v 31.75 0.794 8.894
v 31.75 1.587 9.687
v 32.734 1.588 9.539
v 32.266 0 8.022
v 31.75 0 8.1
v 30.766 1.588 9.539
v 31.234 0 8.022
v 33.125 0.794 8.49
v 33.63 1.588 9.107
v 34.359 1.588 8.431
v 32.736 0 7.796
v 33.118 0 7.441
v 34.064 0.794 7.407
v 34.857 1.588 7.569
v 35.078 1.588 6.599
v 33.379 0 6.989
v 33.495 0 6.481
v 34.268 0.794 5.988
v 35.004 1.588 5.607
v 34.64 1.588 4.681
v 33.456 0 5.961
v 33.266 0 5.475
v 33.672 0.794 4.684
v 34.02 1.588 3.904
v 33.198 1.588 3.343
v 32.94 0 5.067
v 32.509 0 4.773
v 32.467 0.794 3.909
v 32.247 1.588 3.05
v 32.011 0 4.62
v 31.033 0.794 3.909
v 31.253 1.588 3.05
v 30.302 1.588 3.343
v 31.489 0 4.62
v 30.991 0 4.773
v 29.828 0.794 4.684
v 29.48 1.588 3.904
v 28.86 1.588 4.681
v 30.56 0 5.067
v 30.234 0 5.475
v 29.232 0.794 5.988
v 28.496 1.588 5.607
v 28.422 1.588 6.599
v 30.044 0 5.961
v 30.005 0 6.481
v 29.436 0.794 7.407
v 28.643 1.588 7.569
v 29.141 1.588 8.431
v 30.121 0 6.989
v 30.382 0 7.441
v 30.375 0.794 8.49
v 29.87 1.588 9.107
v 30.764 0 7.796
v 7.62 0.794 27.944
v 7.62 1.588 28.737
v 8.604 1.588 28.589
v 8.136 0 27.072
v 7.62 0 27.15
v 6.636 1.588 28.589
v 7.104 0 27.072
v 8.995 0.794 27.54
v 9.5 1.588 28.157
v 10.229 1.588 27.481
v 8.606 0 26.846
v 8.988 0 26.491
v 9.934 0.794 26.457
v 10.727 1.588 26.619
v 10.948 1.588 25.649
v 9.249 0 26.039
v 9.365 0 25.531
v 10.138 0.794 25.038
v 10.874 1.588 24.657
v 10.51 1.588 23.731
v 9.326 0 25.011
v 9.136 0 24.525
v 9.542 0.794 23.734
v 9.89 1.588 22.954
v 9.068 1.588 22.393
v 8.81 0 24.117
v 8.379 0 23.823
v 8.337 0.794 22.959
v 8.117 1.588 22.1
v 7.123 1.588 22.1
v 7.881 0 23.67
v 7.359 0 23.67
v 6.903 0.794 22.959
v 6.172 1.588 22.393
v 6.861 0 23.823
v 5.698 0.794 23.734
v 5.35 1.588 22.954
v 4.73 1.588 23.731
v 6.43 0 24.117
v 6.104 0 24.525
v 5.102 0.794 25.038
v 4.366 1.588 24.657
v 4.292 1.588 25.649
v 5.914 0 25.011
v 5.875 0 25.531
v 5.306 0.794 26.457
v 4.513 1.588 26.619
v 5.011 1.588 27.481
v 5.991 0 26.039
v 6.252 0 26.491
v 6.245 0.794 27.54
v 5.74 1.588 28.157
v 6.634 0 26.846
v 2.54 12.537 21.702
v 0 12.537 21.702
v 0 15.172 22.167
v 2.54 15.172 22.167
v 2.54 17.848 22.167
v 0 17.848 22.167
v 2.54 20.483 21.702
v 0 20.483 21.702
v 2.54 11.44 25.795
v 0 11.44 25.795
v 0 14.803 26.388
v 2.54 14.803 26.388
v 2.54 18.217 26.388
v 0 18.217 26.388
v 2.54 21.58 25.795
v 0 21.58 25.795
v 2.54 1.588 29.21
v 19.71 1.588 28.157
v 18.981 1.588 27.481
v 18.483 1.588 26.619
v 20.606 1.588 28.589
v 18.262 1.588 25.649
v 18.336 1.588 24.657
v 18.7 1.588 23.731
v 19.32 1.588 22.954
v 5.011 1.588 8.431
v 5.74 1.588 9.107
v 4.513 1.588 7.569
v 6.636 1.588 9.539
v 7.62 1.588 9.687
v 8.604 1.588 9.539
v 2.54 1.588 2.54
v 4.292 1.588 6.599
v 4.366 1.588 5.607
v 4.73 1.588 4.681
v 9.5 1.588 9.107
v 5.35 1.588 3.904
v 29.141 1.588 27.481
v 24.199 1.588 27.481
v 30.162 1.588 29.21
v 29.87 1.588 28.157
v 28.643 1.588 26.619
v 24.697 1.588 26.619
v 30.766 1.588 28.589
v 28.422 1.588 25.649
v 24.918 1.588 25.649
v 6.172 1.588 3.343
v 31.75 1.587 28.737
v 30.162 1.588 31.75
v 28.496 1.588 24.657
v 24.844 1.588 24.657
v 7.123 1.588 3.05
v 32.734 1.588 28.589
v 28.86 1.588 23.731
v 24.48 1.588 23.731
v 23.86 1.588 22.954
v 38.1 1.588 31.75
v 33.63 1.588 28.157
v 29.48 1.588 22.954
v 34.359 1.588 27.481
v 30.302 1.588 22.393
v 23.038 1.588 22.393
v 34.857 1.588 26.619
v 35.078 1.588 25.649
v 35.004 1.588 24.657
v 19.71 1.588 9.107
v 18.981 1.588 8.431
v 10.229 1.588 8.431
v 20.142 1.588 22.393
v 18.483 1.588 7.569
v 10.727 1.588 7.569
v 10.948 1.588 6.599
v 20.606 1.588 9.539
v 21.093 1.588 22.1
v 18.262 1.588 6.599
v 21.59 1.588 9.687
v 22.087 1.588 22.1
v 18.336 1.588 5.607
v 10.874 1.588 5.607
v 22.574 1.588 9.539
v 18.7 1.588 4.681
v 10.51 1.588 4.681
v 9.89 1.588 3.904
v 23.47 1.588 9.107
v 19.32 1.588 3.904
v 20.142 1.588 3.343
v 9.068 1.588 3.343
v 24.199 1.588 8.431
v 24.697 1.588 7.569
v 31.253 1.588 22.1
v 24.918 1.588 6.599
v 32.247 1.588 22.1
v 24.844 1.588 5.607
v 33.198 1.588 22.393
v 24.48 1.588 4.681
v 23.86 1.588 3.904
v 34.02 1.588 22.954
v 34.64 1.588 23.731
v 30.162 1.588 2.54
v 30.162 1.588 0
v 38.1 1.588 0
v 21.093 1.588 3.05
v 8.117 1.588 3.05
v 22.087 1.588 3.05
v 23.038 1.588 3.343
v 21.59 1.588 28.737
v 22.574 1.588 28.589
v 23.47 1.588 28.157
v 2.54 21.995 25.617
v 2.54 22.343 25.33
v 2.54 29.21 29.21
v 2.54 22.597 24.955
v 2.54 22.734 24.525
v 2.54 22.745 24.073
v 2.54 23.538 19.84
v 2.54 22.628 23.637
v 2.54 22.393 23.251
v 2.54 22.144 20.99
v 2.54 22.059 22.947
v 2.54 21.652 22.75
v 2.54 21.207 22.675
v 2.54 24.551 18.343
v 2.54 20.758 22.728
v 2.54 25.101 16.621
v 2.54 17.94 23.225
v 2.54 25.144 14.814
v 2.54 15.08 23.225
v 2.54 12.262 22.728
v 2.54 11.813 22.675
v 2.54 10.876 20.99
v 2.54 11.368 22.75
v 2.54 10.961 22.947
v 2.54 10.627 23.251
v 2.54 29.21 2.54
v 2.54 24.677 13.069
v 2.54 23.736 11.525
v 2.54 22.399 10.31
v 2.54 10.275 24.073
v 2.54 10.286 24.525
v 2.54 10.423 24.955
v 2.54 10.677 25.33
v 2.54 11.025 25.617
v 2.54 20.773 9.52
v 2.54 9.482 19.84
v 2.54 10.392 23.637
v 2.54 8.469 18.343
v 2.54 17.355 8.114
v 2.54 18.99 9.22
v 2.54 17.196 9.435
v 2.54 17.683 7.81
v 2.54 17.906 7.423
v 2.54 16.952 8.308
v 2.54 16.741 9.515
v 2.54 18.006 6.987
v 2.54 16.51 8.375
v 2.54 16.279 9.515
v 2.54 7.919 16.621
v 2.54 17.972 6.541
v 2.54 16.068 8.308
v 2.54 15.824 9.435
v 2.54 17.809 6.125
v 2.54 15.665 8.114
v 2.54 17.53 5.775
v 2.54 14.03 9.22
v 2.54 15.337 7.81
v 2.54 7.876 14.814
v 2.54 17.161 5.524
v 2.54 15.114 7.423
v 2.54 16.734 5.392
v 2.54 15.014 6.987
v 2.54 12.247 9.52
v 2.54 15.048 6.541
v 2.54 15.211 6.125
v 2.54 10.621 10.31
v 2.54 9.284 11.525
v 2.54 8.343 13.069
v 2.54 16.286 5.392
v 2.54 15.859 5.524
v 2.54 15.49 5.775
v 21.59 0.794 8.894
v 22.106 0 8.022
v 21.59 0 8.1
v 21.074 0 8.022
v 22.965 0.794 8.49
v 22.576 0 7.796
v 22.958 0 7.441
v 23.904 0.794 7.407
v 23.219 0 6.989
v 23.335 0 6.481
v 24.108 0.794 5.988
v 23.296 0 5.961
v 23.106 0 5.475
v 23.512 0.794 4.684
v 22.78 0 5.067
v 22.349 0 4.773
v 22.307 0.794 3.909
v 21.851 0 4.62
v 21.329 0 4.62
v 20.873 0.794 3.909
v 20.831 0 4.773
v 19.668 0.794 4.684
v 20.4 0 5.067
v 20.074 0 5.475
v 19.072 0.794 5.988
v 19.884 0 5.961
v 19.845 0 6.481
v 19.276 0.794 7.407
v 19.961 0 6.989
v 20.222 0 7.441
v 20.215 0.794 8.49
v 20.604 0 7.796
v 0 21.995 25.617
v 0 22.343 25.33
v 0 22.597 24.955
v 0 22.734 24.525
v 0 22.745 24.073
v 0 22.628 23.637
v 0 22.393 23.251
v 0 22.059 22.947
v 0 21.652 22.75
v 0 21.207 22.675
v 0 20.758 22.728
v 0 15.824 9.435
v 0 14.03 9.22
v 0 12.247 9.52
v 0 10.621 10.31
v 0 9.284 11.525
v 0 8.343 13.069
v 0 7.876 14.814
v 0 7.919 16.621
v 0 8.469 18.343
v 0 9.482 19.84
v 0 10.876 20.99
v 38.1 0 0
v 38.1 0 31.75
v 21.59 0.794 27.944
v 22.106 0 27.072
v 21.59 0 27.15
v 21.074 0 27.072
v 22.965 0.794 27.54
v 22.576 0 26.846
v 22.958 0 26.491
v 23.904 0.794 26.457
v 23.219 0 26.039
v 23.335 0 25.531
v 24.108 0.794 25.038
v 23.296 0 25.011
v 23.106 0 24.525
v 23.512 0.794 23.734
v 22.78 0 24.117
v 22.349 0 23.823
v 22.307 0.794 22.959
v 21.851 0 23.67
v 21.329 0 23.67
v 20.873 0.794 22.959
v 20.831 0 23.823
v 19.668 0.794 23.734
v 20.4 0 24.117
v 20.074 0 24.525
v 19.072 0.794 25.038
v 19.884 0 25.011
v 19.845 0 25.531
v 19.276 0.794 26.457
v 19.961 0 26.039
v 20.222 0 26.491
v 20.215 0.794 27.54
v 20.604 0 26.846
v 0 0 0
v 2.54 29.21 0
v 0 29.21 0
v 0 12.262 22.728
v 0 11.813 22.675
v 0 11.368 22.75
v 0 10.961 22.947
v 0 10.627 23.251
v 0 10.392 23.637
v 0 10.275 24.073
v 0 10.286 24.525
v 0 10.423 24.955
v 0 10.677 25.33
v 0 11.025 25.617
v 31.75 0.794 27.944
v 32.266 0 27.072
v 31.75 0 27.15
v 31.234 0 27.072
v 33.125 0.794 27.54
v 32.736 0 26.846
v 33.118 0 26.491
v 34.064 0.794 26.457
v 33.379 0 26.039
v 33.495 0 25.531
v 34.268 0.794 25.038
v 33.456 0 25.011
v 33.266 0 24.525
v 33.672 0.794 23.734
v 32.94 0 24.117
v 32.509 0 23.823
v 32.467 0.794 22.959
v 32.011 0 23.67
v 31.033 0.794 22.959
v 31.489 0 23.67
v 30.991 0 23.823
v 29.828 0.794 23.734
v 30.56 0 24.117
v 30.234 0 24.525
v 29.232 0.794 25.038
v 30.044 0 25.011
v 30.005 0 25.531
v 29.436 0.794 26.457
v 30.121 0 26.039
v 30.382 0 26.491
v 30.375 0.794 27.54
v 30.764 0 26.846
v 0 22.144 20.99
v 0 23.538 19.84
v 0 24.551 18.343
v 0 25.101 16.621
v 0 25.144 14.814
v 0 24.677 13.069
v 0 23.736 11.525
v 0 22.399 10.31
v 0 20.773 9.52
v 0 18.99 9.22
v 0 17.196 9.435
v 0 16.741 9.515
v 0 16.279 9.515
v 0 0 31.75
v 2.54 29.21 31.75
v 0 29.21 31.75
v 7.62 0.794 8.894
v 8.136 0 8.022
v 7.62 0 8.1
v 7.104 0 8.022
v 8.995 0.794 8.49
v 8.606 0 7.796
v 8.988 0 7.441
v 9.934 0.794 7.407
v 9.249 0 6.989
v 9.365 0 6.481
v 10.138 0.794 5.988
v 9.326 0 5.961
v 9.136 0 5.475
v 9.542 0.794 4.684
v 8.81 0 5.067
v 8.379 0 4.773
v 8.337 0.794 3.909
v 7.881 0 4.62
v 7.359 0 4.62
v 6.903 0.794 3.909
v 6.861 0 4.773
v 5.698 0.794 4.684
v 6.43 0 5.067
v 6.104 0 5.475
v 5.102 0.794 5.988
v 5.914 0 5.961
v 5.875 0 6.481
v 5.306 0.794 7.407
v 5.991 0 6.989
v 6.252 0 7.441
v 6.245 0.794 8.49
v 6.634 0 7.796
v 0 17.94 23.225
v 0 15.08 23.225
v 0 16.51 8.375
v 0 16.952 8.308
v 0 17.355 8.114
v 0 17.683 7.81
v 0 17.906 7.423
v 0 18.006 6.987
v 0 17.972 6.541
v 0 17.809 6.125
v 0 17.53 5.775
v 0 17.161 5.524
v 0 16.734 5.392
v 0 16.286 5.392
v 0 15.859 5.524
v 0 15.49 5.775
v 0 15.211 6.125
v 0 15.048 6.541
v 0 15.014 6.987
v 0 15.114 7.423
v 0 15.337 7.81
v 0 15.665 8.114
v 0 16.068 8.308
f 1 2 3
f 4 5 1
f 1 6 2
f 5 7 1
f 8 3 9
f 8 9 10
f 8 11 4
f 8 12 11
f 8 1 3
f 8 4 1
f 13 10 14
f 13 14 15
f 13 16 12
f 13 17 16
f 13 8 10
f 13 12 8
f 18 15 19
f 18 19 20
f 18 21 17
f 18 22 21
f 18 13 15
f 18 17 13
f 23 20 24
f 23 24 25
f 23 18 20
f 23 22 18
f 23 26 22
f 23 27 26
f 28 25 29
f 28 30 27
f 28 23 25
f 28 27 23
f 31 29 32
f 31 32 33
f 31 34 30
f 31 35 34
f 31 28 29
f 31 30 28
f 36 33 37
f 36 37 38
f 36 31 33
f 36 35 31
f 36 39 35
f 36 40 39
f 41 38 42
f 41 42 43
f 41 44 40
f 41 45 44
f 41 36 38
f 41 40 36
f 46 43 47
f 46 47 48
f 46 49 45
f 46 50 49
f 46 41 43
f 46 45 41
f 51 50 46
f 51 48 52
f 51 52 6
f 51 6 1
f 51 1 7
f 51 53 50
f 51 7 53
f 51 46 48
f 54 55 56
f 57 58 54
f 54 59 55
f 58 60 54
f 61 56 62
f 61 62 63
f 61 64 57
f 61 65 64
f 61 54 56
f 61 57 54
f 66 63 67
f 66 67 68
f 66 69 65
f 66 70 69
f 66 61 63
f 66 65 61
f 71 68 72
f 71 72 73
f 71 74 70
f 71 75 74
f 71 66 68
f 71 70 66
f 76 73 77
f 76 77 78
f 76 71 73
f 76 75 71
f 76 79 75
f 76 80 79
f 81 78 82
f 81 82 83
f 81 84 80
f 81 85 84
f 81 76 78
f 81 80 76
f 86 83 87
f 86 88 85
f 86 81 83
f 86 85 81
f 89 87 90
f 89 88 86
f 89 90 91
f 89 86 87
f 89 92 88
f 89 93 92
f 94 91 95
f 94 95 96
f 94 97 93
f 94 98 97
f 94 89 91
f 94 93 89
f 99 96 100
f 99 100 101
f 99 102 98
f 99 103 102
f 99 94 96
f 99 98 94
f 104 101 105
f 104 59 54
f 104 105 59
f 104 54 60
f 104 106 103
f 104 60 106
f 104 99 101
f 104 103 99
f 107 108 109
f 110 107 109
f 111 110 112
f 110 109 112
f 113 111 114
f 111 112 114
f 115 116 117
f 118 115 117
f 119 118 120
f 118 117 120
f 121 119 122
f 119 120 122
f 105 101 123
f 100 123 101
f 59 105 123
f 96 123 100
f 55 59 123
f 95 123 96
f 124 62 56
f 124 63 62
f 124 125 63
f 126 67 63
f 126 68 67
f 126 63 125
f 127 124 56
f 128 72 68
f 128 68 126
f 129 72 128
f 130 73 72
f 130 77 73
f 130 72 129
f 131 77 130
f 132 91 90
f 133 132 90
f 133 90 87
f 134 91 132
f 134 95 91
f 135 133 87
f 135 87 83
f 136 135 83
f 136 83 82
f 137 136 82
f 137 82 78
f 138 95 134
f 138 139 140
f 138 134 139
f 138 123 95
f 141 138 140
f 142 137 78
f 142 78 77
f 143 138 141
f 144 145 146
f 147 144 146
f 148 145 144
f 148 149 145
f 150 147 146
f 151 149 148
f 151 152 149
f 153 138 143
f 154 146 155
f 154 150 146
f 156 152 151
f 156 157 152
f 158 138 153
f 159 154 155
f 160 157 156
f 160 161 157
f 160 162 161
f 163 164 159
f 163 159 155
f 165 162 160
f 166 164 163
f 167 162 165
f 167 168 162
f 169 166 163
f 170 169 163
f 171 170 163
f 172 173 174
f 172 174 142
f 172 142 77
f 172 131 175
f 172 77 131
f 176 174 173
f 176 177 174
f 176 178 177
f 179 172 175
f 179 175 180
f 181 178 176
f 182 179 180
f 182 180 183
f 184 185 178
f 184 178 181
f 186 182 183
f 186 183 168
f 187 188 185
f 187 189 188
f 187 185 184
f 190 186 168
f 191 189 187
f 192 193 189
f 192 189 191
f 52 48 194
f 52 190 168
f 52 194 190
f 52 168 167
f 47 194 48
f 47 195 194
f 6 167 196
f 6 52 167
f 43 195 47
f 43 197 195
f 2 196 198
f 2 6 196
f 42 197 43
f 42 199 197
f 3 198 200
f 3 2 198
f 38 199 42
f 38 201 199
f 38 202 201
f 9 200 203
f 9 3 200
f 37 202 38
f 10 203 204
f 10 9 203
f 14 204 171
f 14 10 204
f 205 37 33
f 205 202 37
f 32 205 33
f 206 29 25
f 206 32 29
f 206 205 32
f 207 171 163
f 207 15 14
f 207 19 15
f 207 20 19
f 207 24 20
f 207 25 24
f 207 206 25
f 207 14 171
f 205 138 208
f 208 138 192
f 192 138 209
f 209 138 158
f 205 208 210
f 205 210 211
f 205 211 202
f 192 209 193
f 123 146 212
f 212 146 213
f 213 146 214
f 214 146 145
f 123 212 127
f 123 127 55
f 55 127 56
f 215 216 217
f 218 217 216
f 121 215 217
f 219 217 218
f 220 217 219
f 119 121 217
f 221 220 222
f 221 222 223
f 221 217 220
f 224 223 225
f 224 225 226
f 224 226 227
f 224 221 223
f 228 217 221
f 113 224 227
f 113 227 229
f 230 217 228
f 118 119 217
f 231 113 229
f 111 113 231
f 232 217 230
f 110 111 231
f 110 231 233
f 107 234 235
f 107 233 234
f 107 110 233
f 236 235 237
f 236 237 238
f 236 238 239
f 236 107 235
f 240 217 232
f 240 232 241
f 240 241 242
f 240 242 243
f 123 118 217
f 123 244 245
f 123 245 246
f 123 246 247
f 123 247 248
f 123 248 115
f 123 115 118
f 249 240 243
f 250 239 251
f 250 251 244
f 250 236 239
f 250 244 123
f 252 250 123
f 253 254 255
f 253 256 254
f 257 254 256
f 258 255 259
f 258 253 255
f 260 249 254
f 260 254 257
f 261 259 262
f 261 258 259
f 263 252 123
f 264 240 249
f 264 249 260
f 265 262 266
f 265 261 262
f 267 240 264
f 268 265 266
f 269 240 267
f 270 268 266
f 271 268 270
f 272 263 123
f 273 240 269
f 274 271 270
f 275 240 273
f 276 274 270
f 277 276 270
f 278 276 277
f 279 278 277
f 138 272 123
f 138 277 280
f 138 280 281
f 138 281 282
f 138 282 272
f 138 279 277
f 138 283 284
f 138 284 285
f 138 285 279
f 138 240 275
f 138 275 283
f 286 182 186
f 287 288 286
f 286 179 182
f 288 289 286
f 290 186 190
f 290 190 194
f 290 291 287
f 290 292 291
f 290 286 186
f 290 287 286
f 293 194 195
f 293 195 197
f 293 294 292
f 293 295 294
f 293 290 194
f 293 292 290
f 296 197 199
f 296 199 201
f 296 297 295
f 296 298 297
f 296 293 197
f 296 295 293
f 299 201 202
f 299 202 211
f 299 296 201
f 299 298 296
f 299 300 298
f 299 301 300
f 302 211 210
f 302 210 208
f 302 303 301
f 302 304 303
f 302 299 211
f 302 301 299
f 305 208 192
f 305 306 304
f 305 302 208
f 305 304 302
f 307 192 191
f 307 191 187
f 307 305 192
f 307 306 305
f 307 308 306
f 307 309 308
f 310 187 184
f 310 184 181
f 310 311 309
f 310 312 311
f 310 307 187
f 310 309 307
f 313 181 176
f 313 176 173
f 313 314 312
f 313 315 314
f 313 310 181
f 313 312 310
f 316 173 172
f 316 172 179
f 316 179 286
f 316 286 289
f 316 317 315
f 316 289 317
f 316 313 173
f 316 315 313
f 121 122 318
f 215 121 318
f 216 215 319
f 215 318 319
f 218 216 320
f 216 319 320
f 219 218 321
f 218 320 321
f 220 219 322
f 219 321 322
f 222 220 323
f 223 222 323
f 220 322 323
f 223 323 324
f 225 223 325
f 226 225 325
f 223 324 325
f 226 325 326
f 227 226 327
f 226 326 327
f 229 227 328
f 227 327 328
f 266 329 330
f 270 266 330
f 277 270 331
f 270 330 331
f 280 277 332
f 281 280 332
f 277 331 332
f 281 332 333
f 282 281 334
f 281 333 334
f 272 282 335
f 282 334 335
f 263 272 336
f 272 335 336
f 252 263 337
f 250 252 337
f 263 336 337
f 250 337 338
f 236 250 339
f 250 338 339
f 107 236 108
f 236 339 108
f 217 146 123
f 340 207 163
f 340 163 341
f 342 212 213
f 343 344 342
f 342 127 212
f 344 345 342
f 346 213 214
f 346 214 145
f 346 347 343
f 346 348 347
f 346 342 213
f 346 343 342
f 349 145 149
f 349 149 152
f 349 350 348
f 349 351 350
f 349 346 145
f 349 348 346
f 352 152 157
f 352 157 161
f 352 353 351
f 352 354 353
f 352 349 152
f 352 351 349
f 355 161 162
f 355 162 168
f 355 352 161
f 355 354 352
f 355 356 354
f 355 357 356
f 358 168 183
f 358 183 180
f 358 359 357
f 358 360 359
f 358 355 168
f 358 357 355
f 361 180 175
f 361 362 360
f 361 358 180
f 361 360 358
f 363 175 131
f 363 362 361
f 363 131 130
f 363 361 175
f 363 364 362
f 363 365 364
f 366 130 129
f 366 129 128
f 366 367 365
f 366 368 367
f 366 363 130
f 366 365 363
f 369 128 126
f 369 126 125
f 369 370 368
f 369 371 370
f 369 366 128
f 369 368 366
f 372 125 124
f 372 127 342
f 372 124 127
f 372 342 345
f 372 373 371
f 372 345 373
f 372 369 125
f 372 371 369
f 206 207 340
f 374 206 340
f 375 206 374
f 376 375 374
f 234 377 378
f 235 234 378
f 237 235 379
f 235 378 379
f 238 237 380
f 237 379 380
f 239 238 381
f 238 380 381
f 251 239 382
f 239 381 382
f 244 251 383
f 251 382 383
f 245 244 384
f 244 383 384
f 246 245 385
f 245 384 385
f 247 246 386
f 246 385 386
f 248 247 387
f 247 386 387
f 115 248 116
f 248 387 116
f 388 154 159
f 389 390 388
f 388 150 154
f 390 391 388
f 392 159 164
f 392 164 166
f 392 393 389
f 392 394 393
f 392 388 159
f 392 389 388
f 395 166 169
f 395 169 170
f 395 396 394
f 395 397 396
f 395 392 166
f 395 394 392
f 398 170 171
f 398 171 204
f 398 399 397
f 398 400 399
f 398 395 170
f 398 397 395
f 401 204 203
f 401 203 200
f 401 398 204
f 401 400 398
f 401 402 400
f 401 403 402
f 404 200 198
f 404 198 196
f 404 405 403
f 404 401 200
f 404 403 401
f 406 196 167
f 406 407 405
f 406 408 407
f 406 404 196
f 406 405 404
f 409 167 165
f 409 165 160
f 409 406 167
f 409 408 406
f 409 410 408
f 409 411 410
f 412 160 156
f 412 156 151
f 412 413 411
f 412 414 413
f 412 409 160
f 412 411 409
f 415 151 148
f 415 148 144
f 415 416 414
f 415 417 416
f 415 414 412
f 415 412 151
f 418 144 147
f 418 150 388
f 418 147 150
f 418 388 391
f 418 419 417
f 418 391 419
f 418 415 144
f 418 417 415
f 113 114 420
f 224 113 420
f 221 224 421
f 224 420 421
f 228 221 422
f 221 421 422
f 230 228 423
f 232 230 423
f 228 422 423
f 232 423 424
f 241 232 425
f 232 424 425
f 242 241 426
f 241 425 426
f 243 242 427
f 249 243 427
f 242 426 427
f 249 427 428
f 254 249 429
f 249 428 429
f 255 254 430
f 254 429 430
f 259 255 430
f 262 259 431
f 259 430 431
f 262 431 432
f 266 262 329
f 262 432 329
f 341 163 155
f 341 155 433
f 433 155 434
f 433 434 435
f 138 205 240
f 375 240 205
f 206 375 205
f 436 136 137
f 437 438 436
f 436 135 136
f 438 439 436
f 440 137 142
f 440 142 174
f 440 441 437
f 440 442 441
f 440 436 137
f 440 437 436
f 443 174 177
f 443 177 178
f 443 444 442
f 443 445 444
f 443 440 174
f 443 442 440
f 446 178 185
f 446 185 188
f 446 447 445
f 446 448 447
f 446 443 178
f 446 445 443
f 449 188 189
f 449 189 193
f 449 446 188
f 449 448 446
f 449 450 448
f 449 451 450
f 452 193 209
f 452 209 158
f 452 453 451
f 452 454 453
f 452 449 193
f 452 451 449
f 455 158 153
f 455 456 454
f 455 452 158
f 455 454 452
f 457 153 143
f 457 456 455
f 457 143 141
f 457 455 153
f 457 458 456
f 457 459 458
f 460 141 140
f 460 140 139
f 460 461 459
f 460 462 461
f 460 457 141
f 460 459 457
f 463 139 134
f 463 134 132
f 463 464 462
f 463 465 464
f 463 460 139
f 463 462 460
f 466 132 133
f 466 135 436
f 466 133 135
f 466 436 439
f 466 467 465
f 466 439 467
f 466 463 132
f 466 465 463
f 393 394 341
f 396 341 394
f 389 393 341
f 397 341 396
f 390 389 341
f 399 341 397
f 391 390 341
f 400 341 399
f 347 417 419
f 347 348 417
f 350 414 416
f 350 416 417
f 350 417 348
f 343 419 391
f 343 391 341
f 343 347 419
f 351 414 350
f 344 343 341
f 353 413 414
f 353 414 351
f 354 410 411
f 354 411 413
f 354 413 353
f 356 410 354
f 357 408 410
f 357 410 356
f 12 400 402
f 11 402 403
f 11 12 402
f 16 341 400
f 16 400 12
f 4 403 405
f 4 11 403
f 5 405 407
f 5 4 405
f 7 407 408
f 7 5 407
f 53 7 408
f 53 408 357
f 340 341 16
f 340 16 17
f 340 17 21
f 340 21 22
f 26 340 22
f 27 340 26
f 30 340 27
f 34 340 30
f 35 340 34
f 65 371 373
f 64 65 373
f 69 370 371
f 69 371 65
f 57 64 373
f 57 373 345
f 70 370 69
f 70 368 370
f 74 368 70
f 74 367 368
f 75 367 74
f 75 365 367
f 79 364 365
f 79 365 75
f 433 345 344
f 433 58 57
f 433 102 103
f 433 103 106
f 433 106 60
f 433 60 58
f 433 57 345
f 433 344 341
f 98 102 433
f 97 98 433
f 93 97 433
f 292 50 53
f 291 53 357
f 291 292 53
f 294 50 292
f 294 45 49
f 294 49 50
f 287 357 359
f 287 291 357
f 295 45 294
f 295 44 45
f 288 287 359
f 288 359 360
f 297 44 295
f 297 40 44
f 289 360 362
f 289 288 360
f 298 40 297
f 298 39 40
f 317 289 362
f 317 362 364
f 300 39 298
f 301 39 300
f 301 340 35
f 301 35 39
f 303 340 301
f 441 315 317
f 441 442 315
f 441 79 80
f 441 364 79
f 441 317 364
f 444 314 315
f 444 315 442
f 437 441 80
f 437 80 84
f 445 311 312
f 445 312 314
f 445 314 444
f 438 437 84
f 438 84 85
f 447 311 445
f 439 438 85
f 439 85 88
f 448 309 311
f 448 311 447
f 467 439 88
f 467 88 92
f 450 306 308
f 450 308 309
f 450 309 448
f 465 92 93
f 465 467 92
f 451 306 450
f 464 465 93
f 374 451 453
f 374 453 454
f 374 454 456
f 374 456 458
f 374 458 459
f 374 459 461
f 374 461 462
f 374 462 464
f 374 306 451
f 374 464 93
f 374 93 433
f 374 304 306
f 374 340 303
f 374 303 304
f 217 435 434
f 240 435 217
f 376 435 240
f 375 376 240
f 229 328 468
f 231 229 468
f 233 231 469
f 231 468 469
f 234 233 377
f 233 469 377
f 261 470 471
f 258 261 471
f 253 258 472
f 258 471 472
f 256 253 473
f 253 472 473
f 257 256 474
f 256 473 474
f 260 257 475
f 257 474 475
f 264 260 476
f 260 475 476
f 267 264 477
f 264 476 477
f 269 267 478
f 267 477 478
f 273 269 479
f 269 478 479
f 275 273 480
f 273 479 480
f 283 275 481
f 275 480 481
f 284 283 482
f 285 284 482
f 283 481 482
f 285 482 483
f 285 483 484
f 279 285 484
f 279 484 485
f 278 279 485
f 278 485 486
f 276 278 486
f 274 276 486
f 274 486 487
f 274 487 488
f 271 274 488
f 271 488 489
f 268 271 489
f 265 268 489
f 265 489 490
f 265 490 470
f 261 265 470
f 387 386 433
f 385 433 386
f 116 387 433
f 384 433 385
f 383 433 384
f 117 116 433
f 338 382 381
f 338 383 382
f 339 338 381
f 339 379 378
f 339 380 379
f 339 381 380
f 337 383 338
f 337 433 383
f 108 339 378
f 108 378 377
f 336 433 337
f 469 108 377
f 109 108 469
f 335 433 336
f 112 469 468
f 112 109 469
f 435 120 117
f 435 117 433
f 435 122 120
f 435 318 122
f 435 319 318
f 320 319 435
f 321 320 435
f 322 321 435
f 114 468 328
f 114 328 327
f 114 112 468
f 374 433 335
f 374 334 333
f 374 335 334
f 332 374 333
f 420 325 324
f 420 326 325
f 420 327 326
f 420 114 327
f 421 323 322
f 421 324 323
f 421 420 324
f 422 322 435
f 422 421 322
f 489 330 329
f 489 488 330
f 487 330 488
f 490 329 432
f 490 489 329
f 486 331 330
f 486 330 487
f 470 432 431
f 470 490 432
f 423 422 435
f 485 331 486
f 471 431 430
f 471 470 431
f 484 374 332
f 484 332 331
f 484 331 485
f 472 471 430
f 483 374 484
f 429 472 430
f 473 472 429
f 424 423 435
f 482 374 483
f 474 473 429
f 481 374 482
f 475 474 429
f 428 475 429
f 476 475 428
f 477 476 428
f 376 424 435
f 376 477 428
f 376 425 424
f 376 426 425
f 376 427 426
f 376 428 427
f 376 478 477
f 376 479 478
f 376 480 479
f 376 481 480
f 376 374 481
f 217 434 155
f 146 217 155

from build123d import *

# Parameters (mm, degrees)
BOSS_EXTRUDE1_DEPTH = 31.75
SKETCH2_R           = 6.35
CUT_EXTRUDE1_DEPTH  = 58.557767504
SKETCH3_R           = 1.5
CUT_EXTRUDE2_DEPTH  = 58.557767504
BOSS_EXTRUDE2_DEPTH = 2.54
BOSS_EXTRUDE3_START = -29.21
BOSS_EXTRUDE3_DEPTH = 2.54
SKETCH5_R           = 1.75
CUT_EXTRUDE3_DEPTH  = 2.54
CHAMFER1_SIZE       = 1.5875


with BuildPart() as part:
    # Sketch1 → Boss-Extrude1 (new body)
    with BuildSketch(Plane.XY):
        Polygon((0, 0), (0, 29.21), (2.54, 29.21), (2.54, 1.5875), (38.1, 1.5875), (38.1, 0), align=None)
    extrude(amount=BOSS_EXTRUDE1_DEPTH)

    # Sketch2 → Cut-Extrude1 (cut, through all)
    with BuildSketch(Plane.ZY):
        with Locations((15.875, 16.51)):
            Circle(SKETCH2_R)
    extrude(amount=-CUT_EXTRUDE1_DEPTH, mode=Mode.SUBTRACT)

    # Sketch3 → Cut-Extrude2 (cut, through all)
    with BuildSketch(Plane.ZY):
        with Locations((6.875, 16.51)):
            Circle(SKETCH3_R)
        with BuildLine():
            ThreePointArc((21.701961434, 12.537127658), (22.225, 16.51), (21.701961434, 20.482872342))
            ThreePointArc((21.701961434, 20.482872342), (13.9248315, 24.973000403), (9.43470344, 17.19587047))
            ThreePointArc((9.43470344, 17.19587047), (9.525, 16.51), (9.43470344, 15.82412953))
            ThreePointArc((9.43470344, 15.82412953), (13.9248315, 8.046999597), (21.701961434, 12.537127658))
        make_face()
        with BuildLine():
            ThreePointArc((25.79507191, 11.440382011), (26.46249978, 16.51), (25.79507191, 21.579617989))
            ThreePointArc((25.79507191, 21.579617989), (23.850789427, 22.702150004), (22.728257411, 20.757867521))
            ThreePointArc((22.728257411, 20.757867521), (23.28749978, 16.51), (22.728257411, 12.262132479))
            ThreePointArc((22.728257411, 12.262132479), (23.850789427, 10.317849996), (25.79507191, 11.440382011))
        make_face()
    extrude(amount=-CUT_EXTRUDE2_DEPTH, mode=Mode.SUBTRACT)

    # Sketch4 → Boss-Extrude2 (add)
    with BuildSketch(Plane.XY.offset(31.75)):
        Polygon((2.54, 29.21), (30.1625, 1.5875), (2.54, 1.5875), align=None)
    extrude(amount=-BOSS_EXTRUDE2_DEPTH)

    # Sketch4<2> → Boss-Extrude3 (add)
    with BuildSketch(Plane.XY.offset(31.75).offset(BOSS_EXTRUDE3_START)):
        Polygon((2.54, 29.21), (30.1625, 1.5875), (2.54, 1.5875), align=None)
    extrude(amount=-BOSS_EXTRUDE3_DEPTH)

    # Sketch5 → Cut-Extrude3 (cut)
    with BuildSketch(Plane(origin=(0, 1.5875, 0), x_dir=(1, 0, 0), z_dir=(0, 1, 0))):
        with Locations(Location((7.62, -6.35, 0), (0, 0, 270))):
            Circle(SKETCH5_R)
        with Locations(Location((31.75, -25.4, 0), (0, 0, 270))):
            Circle(SKETCH5_R)
        with Locations(Location((31.75, -6.35, 0), (0, 0, 270))):
            Circle(SKETCH5_R)
        with Locations(Location((7.62, -25.4, 0), (0, 0, 270))):
            Circle(SKETCH5_R)
        with Locations(Location((21.59, -6.35, 0), (0, 0, 270))):
            Circle(SKETCH5_R)
        with Locations(Location((21.59, -25.4, 0), (0, 0, 270))):
            Circle(SKETCH5_R)
    extrude(amount=-CUT_EXTRUDE3_DEPTH, mode=Mode.SUBTRACT)

    # Chamfer1
    chamfer1_edges = [part.edges().sort_by_distance(p)[0] for p in [
        (31.75, 1.5875, 23.65),
        (31.75, 1.5875, 4.6),
        (7.62, 1.5875, 23.65),
        (21.59, 1.5875, 23.65),
        (21.59, 1.5875, 4.6),
        (7.62, 1.5875, 4.6),
    ]]
    chamfer(chamfer1_edges, length=CHAMFER1_SIZE - 0.0001)  # a hair under: the kernel refuses the full size


solid = part.part
